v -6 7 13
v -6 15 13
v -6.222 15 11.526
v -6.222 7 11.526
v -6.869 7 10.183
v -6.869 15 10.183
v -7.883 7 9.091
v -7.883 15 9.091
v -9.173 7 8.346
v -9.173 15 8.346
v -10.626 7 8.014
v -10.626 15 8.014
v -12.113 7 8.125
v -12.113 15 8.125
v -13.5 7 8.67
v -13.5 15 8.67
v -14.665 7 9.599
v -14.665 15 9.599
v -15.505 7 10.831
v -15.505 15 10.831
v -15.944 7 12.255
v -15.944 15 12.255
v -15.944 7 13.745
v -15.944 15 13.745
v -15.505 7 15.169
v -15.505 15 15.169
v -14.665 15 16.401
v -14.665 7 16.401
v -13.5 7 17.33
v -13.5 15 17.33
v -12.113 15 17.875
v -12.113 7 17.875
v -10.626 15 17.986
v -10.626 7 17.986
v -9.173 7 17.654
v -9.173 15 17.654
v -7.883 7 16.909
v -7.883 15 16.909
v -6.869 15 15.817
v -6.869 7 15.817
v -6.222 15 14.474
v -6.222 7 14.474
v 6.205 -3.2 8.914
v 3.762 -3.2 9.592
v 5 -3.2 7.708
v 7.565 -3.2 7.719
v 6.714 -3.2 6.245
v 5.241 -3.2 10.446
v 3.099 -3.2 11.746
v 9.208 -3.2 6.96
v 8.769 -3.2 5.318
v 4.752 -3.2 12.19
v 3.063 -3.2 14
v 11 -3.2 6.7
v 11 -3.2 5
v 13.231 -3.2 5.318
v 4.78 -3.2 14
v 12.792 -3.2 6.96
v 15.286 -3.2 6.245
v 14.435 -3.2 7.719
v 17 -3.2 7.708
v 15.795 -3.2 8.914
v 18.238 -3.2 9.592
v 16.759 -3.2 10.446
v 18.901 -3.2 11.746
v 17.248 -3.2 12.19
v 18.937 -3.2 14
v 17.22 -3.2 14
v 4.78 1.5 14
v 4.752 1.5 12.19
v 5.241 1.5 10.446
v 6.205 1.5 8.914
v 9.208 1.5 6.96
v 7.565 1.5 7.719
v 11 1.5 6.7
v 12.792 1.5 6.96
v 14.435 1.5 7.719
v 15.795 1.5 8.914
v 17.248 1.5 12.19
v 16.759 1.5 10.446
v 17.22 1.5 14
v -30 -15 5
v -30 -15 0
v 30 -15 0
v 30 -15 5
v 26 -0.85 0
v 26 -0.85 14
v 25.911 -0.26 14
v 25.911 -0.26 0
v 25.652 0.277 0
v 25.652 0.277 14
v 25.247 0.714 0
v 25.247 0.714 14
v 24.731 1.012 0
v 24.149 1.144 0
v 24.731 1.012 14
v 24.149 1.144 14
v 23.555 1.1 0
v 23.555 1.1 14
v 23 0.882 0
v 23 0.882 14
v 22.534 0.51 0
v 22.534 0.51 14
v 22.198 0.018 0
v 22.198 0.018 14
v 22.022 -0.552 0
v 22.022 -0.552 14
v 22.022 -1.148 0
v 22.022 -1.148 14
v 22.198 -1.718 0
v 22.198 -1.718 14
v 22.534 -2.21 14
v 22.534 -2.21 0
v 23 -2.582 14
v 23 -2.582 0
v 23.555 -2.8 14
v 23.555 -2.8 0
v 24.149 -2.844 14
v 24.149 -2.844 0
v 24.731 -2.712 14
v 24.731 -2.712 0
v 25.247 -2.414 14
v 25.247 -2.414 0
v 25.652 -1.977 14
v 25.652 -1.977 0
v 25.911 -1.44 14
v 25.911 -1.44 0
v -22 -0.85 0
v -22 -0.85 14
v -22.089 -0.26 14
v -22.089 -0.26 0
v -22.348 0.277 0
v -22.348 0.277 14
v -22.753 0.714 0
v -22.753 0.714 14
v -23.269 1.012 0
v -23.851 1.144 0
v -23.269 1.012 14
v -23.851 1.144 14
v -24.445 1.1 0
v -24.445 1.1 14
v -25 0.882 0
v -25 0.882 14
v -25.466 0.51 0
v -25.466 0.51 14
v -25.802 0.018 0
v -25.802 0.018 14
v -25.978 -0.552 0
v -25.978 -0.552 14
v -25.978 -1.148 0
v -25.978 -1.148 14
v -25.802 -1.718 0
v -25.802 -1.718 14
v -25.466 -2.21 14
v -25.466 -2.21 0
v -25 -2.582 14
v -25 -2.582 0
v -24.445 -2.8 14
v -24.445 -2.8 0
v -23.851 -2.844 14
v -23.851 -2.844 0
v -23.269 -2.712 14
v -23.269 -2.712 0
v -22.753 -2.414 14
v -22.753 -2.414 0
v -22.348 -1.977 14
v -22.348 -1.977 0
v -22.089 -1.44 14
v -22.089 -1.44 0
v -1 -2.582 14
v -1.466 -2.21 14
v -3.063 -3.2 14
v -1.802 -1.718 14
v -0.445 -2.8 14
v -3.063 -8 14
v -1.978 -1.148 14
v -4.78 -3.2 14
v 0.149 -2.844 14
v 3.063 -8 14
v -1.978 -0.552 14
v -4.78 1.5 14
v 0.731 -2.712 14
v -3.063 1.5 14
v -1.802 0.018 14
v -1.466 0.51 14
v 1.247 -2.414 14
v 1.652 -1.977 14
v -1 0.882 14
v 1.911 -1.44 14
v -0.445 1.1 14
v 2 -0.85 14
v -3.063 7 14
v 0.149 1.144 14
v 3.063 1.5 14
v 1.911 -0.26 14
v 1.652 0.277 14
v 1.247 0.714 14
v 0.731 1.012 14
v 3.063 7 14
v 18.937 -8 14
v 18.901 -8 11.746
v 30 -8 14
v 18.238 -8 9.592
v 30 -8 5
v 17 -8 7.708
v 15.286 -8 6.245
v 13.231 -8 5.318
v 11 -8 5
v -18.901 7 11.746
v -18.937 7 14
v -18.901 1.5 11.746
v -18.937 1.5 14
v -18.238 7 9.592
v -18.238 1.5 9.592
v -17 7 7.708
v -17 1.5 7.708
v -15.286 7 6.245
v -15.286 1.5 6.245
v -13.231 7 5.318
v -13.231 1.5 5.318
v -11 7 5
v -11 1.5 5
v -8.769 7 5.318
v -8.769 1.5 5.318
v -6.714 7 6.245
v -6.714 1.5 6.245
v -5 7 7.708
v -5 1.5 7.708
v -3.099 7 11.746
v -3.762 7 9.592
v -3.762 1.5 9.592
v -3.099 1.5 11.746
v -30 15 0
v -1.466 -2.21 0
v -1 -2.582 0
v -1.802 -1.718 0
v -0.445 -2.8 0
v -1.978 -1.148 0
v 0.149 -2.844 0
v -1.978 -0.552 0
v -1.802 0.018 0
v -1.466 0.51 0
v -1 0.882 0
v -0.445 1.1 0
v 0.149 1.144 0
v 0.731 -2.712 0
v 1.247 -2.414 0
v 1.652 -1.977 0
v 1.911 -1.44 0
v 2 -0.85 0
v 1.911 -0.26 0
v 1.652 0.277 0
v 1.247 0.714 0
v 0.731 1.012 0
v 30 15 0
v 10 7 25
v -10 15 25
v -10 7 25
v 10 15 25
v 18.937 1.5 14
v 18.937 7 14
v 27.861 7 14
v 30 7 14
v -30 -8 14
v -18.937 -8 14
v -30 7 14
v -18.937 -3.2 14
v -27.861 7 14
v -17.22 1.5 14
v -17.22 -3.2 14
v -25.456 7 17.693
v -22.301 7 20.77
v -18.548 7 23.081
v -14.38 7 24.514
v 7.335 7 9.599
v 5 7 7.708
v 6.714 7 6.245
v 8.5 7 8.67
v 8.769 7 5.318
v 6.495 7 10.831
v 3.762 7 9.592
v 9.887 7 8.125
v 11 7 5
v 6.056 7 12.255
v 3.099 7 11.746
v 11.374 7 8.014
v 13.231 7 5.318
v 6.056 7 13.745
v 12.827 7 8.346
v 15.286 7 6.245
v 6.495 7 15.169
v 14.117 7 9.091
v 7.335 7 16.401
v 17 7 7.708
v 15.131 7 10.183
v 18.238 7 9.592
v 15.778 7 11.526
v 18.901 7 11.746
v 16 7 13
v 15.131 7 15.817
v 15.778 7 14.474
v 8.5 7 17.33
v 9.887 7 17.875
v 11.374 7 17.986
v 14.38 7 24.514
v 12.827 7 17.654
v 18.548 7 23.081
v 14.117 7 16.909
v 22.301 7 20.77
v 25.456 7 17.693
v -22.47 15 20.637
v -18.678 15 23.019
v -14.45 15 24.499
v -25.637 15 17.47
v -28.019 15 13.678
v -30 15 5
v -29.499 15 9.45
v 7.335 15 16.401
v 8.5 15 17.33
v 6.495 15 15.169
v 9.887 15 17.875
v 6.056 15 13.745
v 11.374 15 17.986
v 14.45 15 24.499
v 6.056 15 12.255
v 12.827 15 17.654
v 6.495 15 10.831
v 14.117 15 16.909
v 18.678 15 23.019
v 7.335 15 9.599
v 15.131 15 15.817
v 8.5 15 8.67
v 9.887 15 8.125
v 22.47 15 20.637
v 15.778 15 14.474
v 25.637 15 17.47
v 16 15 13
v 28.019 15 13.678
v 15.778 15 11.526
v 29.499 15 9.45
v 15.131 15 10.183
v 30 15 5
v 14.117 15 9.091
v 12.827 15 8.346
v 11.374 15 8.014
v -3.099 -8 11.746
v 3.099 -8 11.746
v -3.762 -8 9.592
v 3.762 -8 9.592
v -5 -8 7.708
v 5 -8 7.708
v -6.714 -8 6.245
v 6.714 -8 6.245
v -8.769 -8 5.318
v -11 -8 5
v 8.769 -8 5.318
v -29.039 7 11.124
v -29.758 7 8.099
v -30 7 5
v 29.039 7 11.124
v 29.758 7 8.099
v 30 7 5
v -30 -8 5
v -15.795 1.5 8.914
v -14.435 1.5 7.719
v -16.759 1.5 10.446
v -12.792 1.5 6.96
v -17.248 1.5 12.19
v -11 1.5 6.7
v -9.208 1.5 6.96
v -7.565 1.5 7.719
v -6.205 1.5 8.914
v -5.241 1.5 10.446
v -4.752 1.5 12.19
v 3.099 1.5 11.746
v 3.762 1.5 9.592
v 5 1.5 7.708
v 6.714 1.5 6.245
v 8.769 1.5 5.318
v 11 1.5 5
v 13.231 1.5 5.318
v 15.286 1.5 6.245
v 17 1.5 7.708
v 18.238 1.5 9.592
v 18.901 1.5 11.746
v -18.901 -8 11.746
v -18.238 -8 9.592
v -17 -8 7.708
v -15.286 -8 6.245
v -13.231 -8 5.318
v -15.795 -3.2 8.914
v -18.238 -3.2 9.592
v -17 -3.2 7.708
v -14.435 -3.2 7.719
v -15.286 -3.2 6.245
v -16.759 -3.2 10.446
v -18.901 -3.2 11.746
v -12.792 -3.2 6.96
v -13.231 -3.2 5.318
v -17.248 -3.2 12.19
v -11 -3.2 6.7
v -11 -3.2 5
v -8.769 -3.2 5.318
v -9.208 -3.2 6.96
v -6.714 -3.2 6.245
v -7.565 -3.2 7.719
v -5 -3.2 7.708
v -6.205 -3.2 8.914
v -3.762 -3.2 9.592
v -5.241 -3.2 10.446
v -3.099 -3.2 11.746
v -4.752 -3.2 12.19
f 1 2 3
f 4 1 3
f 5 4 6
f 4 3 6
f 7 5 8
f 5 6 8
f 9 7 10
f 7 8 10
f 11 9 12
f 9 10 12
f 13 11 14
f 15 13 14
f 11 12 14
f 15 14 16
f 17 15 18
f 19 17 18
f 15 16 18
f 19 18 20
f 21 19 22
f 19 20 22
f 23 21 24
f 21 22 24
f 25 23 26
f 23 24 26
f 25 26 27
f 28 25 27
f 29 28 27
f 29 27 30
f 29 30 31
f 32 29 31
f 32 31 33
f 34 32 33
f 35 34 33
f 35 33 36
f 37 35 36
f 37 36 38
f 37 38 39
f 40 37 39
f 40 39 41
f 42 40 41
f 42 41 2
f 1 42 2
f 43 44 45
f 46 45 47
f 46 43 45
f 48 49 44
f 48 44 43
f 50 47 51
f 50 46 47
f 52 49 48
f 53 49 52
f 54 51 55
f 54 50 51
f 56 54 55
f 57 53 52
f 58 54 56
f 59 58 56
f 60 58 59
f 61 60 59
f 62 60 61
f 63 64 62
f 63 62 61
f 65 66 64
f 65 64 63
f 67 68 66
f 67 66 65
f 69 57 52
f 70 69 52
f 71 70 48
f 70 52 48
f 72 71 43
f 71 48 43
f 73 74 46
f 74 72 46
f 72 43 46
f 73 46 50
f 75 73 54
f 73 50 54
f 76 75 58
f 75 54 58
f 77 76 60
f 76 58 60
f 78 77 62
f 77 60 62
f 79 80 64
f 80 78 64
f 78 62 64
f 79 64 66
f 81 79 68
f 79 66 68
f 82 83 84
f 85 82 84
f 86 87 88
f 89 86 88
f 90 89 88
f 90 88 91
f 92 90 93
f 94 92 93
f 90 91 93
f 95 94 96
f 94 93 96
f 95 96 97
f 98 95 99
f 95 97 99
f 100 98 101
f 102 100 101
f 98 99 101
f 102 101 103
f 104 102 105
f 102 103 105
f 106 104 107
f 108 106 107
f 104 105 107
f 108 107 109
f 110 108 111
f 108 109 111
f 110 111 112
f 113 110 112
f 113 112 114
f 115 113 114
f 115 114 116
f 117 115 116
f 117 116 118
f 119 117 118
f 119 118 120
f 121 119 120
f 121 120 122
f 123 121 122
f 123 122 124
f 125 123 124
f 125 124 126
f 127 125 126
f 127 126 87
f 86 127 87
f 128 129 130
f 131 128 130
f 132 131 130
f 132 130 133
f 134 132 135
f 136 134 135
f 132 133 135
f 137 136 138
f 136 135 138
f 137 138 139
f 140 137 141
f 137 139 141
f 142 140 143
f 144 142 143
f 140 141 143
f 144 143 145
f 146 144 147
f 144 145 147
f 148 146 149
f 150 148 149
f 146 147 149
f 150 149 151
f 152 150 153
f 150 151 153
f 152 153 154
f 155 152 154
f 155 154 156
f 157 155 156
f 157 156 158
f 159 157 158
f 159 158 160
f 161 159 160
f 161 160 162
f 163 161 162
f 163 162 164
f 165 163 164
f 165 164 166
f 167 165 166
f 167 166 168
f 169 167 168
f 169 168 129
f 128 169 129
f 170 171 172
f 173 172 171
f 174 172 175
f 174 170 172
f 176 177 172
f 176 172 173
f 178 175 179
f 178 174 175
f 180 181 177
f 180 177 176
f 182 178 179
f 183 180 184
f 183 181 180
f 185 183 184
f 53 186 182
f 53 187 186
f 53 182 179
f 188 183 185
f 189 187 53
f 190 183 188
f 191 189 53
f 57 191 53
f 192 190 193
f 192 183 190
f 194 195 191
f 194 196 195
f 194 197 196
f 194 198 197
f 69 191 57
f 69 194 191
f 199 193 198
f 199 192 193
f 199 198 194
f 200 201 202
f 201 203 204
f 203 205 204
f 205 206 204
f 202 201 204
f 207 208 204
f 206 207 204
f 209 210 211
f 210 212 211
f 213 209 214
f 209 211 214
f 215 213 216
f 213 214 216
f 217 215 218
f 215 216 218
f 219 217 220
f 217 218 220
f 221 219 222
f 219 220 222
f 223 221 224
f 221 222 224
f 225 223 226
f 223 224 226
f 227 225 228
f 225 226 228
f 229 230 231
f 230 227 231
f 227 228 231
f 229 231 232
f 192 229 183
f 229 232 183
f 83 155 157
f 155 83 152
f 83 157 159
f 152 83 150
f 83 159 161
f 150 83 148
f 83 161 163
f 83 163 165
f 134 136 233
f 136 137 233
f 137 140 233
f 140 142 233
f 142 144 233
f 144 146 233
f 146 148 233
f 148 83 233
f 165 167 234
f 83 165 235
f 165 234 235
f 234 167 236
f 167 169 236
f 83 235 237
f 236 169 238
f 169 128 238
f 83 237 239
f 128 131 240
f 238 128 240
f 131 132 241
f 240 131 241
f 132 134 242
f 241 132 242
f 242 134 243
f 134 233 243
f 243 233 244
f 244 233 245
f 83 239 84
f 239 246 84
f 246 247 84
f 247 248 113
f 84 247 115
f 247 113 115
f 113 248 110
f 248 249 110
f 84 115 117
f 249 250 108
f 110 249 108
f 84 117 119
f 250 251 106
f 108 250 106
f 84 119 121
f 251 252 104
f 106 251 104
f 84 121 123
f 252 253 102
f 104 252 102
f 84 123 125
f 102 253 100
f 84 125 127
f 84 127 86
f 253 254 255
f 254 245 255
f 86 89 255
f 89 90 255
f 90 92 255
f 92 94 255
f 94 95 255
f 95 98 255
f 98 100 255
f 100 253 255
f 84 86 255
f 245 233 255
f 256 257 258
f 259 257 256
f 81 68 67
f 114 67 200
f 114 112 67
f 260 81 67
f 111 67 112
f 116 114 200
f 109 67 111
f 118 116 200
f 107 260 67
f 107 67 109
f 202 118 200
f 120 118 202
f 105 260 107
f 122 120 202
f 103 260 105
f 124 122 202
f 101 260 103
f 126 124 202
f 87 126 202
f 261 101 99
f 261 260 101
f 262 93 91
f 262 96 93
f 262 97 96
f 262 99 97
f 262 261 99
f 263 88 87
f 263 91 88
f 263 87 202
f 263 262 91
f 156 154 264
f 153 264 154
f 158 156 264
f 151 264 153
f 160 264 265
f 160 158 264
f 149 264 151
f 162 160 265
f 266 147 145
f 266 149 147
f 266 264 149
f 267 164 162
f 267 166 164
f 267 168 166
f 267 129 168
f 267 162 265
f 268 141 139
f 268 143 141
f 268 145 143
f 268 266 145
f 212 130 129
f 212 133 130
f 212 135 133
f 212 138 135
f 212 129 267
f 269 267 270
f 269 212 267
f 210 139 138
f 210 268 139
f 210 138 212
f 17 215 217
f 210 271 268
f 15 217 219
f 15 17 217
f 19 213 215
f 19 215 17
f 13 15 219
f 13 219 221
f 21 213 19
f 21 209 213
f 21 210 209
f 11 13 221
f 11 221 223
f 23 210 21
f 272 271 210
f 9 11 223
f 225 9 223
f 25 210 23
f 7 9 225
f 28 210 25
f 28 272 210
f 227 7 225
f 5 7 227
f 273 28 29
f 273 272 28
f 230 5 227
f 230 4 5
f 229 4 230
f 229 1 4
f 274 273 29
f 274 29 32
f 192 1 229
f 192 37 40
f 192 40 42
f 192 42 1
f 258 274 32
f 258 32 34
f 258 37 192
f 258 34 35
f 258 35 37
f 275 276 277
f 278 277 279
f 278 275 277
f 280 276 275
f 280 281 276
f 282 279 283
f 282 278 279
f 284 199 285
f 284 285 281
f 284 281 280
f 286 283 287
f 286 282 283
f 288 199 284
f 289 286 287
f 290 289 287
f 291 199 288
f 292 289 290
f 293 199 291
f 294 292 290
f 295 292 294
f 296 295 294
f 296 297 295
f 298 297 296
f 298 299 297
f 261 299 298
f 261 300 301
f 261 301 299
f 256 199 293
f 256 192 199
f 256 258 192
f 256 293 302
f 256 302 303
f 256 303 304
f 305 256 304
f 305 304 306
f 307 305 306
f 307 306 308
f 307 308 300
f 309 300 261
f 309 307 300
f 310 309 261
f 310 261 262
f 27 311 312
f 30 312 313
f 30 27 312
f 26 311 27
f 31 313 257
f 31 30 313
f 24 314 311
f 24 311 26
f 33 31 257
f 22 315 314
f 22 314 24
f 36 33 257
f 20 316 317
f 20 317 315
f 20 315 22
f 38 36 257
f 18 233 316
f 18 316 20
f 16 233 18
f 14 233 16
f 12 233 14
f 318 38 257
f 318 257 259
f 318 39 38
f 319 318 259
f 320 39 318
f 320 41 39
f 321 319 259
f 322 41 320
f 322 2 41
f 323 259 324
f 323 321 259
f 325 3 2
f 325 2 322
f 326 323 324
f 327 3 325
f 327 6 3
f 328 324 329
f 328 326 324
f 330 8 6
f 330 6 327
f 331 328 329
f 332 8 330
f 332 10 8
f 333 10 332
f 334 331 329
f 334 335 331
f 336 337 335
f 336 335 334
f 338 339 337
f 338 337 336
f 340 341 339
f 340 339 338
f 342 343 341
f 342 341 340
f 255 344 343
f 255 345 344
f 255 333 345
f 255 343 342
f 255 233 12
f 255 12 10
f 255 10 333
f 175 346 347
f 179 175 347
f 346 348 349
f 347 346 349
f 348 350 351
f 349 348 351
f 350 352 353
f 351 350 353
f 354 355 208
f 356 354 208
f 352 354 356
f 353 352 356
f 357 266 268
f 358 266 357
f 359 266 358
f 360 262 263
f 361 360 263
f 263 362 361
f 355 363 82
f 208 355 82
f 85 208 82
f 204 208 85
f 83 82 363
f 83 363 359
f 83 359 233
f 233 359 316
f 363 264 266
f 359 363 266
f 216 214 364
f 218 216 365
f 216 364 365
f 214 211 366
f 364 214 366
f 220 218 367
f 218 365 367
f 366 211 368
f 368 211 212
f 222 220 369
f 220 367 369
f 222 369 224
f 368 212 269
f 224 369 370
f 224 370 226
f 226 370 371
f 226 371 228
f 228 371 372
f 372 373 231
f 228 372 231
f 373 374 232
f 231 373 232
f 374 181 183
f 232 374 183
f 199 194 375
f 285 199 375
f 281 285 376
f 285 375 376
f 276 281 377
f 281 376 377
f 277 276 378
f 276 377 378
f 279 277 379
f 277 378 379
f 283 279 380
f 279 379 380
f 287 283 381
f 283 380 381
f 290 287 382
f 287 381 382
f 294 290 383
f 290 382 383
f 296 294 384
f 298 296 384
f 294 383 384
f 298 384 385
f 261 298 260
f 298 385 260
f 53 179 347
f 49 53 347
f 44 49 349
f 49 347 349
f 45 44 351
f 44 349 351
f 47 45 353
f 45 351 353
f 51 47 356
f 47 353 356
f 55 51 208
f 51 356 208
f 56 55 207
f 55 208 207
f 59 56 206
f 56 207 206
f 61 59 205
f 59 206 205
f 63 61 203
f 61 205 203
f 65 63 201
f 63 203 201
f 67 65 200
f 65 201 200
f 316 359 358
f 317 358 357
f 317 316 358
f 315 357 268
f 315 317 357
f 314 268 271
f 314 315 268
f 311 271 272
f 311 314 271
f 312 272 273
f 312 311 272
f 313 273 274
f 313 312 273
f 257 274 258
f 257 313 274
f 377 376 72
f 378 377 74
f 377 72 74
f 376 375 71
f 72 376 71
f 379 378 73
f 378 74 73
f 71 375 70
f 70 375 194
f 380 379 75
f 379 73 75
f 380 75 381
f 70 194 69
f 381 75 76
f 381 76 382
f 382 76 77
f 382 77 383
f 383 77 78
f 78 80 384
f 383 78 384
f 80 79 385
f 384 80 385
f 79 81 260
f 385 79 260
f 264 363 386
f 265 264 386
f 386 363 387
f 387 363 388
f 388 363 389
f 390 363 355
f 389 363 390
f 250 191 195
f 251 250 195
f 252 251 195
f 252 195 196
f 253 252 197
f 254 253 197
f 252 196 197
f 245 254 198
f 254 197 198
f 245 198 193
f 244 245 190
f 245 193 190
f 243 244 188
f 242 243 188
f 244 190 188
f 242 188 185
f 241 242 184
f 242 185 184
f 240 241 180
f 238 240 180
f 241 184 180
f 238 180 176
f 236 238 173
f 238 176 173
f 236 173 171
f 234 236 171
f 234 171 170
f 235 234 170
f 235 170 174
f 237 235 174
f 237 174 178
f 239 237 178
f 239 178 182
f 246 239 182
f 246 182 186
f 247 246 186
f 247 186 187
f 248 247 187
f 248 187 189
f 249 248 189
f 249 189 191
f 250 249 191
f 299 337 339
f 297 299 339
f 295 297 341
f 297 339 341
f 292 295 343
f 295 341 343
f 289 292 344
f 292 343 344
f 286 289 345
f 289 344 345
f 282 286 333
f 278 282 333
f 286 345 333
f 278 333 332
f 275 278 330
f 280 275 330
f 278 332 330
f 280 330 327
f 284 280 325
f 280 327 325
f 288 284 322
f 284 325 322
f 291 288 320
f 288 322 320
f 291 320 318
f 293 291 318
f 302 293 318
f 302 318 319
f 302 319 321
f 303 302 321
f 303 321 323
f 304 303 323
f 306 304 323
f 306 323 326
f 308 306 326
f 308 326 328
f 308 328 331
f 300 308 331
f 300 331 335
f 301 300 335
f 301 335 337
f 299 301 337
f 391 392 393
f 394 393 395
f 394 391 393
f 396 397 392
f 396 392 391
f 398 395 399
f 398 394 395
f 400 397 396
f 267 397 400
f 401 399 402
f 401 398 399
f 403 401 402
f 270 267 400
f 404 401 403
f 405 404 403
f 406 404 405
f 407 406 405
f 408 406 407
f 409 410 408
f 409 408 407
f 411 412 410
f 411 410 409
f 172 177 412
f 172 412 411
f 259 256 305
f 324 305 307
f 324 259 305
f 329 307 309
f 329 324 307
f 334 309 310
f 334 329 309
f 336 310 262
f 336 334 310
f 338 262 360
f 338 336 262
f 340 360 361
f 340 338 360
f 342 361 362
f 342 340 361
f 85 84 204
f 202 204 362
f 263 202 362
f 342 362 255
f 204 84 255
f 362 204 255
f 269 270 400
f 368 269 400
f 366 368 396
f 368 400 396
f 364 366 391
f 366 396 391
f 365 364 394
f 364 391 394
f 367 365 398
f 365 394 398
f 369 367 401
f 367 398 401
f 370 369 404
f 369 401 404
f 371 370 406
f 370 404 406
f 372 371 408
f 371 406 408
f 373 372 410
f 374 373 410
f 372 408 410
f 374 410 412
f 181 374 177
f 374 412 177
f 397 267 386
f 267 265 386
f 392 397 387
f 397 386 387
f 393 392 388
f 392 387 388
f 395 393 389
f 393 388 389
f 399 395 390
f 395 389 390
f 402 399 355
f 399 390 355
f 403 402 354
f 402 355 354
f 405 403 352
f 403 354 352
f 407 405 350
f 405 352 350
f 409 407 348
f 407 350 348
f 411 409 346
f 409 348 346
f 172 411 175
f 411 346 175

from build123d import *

# Parameters (mm, degrees)
SCHIZZO1_W                   = 60
SCHIZZO1_H                   = 30
ESTRUSIONE_ESTRUSIONE1_DEPTH = 5
SCHIZZO2_W                   = 60
SCHIZZO2_H                   = 8
ESTRUSIONE_ESTRUSIONE2_DEPTH = 20
SCHIZZO3_R                   = 5
TAGLIO_ESTRUSIONE1_DEPTH     = 8
RACCORDO1_R                  = 20
SCHIZZO4_W                   = 60
SCHIZZO4_H                   = 15
ESTRUSIONE_ESTRUSIONE3_DEPTH = 10
SCHIZZO6_R                   = 8
TAGLIO_ESTRUSIONE2_DEPTH     = 15
SCHIZZO8_W                   = 60
SCHIZZO8_H                   = 4.7
ESTRUSIONE_ESTRUSIONE4_DEPTH = 10
SCHIZZO9_R                   = 6.3
TAGLIO_ESTRUSIONE3_DEPTH     = 5
SCHIZZO10_R                  = 2
TAGLIO_ESTRUSIONE4_DEPTH     = 16
SCHIZZO11_W                  = 60
SCHIZZO11_H                  = 15
TAGLIO_ESTRUSIONE5_DEPTH     = 1


with BuildPart() as part:
    # Schizzo1 → Estrusione-Estrusione1 (new body)
    with BuildSketch(Plane.XY):
        Rectangle(SCHIZZO1_W, SCHIZZO1_H)
    extrude(amount=ESTRUSIONE_ESTRUSIONE1_DEPTH)

    # Schizzo2 → Estrusione-Estrusione2 (add)
    with BuildSketch(Plane.XY.offset(5)):
        with Locations((0, 11)):
            Rectangle(SCHIZZO2_W, SCHIZZO2_H)
    extrude(amount=ESTRUSIONE_ESTRUSIONE2_DEPTH)

    # Schizzo3 → Taglio-Estrusione1 (cut)
    with BuildSketch(Plane(origin=(0, 15, 0), x_dir=(1, 0, 0), z_dir=(0, 1, 0))):
        with Locations((11, -13)):
            Circle(SCHIZZO3_R)
        with Locations((-11, -13)):
            Circle(SCHIZZO3_R)
    extrude(amount=-TAGLIO_ESTRUSIONE1_DEPTH, mode=Mode.SUBTRACT)

    # Raccordo1
    raccordo1_edges = [part.edges().sort_by_distance(p)[0] for p in [
        (30, 11, 25),
        (-30, 11, 25),
    ]]
    fillet(raccordo1_edges, radius=RACCORDO1_R)

    # Schizzo4 → Estrusione-Estrusione3 (add)
    with BuildSketch(Plane.XY.offset(5)):
        with Locations((0, -0.5)):
            Rectangle(SCHIZZO4_W, SCHIZZO4_H)
    extrude(amount=ESTRUSIONE_ESTRUSIONE3_DEPTH)

    # Schizzo6 → Taglio-Estrusione2 (cut)
    with BuildSketch(Plane.XZ.offset(8)):
        with Locations((-11, 13)):
            Circle(SCHIZZO6_R)
        with Locations((11, 13)):
            Circle(SCHIZZO6_R)
    extrude(amount=-TAGLIO_ESTRUSIONE2_DEPTH, mode=Mode.SUBTRACT)

    # Schizzo8 → Estrusione-Estrusione4 (add)
    with BuildSketch(Plane.XY.offset(15)):
        with Locations((0, -0.85)):
            Rectangle(SCHIZZO8_W, SCHIZZO8_H)
    extrude(amount=-ESTRUSIONE_ESTRUSIONE4_DEPTH)

    # Schizzo9 → Taglio-Estrusione3 (cut)
    with BuildSketch(Plane.XZ.offset(3.2)):
        with Locations((-11, 13)):
            Circle(SCHIZZO9_R)
        with Locations((11, 13)):
            Circle(SCHIZZO9_R)
    extrude(amount=-TAGLIO_ESTRUSIONE3_DEPTH, mode=Mode.SUBTRACT)

    # Schizzo10 → Taglio-Estrusione4 (cut, through all)
    with BuildSketch(Plane.XY.offset(15)):
        with Locations((0, -0.85)):
            Circle(SCHIZZO10_R)
        with Locations((24, -0.85)):
            Circle(SCHIZZO10_R)
        with Locations((-24, -0.85)):
            Circle(SCHIZZO10_R)
    extrude(amount=-TAGLIO_ESTRUSIONE4_DEPTH, mode=Mode.SUBTRACT)

    # Schizzo11 → Taglio-Estrusione5 (cut)
    with BuildSketch(Plane.XY.offset(15)):
        with Locations((0, -0.5)):
            Rectangle(SCHIZZO11_W, SCHIZZO11_H)
    extrude(amount=-TAGLIO_ESTRUSIONE5_DEPTH, mode=Mode.SUBTRACT)


solid = part.part
